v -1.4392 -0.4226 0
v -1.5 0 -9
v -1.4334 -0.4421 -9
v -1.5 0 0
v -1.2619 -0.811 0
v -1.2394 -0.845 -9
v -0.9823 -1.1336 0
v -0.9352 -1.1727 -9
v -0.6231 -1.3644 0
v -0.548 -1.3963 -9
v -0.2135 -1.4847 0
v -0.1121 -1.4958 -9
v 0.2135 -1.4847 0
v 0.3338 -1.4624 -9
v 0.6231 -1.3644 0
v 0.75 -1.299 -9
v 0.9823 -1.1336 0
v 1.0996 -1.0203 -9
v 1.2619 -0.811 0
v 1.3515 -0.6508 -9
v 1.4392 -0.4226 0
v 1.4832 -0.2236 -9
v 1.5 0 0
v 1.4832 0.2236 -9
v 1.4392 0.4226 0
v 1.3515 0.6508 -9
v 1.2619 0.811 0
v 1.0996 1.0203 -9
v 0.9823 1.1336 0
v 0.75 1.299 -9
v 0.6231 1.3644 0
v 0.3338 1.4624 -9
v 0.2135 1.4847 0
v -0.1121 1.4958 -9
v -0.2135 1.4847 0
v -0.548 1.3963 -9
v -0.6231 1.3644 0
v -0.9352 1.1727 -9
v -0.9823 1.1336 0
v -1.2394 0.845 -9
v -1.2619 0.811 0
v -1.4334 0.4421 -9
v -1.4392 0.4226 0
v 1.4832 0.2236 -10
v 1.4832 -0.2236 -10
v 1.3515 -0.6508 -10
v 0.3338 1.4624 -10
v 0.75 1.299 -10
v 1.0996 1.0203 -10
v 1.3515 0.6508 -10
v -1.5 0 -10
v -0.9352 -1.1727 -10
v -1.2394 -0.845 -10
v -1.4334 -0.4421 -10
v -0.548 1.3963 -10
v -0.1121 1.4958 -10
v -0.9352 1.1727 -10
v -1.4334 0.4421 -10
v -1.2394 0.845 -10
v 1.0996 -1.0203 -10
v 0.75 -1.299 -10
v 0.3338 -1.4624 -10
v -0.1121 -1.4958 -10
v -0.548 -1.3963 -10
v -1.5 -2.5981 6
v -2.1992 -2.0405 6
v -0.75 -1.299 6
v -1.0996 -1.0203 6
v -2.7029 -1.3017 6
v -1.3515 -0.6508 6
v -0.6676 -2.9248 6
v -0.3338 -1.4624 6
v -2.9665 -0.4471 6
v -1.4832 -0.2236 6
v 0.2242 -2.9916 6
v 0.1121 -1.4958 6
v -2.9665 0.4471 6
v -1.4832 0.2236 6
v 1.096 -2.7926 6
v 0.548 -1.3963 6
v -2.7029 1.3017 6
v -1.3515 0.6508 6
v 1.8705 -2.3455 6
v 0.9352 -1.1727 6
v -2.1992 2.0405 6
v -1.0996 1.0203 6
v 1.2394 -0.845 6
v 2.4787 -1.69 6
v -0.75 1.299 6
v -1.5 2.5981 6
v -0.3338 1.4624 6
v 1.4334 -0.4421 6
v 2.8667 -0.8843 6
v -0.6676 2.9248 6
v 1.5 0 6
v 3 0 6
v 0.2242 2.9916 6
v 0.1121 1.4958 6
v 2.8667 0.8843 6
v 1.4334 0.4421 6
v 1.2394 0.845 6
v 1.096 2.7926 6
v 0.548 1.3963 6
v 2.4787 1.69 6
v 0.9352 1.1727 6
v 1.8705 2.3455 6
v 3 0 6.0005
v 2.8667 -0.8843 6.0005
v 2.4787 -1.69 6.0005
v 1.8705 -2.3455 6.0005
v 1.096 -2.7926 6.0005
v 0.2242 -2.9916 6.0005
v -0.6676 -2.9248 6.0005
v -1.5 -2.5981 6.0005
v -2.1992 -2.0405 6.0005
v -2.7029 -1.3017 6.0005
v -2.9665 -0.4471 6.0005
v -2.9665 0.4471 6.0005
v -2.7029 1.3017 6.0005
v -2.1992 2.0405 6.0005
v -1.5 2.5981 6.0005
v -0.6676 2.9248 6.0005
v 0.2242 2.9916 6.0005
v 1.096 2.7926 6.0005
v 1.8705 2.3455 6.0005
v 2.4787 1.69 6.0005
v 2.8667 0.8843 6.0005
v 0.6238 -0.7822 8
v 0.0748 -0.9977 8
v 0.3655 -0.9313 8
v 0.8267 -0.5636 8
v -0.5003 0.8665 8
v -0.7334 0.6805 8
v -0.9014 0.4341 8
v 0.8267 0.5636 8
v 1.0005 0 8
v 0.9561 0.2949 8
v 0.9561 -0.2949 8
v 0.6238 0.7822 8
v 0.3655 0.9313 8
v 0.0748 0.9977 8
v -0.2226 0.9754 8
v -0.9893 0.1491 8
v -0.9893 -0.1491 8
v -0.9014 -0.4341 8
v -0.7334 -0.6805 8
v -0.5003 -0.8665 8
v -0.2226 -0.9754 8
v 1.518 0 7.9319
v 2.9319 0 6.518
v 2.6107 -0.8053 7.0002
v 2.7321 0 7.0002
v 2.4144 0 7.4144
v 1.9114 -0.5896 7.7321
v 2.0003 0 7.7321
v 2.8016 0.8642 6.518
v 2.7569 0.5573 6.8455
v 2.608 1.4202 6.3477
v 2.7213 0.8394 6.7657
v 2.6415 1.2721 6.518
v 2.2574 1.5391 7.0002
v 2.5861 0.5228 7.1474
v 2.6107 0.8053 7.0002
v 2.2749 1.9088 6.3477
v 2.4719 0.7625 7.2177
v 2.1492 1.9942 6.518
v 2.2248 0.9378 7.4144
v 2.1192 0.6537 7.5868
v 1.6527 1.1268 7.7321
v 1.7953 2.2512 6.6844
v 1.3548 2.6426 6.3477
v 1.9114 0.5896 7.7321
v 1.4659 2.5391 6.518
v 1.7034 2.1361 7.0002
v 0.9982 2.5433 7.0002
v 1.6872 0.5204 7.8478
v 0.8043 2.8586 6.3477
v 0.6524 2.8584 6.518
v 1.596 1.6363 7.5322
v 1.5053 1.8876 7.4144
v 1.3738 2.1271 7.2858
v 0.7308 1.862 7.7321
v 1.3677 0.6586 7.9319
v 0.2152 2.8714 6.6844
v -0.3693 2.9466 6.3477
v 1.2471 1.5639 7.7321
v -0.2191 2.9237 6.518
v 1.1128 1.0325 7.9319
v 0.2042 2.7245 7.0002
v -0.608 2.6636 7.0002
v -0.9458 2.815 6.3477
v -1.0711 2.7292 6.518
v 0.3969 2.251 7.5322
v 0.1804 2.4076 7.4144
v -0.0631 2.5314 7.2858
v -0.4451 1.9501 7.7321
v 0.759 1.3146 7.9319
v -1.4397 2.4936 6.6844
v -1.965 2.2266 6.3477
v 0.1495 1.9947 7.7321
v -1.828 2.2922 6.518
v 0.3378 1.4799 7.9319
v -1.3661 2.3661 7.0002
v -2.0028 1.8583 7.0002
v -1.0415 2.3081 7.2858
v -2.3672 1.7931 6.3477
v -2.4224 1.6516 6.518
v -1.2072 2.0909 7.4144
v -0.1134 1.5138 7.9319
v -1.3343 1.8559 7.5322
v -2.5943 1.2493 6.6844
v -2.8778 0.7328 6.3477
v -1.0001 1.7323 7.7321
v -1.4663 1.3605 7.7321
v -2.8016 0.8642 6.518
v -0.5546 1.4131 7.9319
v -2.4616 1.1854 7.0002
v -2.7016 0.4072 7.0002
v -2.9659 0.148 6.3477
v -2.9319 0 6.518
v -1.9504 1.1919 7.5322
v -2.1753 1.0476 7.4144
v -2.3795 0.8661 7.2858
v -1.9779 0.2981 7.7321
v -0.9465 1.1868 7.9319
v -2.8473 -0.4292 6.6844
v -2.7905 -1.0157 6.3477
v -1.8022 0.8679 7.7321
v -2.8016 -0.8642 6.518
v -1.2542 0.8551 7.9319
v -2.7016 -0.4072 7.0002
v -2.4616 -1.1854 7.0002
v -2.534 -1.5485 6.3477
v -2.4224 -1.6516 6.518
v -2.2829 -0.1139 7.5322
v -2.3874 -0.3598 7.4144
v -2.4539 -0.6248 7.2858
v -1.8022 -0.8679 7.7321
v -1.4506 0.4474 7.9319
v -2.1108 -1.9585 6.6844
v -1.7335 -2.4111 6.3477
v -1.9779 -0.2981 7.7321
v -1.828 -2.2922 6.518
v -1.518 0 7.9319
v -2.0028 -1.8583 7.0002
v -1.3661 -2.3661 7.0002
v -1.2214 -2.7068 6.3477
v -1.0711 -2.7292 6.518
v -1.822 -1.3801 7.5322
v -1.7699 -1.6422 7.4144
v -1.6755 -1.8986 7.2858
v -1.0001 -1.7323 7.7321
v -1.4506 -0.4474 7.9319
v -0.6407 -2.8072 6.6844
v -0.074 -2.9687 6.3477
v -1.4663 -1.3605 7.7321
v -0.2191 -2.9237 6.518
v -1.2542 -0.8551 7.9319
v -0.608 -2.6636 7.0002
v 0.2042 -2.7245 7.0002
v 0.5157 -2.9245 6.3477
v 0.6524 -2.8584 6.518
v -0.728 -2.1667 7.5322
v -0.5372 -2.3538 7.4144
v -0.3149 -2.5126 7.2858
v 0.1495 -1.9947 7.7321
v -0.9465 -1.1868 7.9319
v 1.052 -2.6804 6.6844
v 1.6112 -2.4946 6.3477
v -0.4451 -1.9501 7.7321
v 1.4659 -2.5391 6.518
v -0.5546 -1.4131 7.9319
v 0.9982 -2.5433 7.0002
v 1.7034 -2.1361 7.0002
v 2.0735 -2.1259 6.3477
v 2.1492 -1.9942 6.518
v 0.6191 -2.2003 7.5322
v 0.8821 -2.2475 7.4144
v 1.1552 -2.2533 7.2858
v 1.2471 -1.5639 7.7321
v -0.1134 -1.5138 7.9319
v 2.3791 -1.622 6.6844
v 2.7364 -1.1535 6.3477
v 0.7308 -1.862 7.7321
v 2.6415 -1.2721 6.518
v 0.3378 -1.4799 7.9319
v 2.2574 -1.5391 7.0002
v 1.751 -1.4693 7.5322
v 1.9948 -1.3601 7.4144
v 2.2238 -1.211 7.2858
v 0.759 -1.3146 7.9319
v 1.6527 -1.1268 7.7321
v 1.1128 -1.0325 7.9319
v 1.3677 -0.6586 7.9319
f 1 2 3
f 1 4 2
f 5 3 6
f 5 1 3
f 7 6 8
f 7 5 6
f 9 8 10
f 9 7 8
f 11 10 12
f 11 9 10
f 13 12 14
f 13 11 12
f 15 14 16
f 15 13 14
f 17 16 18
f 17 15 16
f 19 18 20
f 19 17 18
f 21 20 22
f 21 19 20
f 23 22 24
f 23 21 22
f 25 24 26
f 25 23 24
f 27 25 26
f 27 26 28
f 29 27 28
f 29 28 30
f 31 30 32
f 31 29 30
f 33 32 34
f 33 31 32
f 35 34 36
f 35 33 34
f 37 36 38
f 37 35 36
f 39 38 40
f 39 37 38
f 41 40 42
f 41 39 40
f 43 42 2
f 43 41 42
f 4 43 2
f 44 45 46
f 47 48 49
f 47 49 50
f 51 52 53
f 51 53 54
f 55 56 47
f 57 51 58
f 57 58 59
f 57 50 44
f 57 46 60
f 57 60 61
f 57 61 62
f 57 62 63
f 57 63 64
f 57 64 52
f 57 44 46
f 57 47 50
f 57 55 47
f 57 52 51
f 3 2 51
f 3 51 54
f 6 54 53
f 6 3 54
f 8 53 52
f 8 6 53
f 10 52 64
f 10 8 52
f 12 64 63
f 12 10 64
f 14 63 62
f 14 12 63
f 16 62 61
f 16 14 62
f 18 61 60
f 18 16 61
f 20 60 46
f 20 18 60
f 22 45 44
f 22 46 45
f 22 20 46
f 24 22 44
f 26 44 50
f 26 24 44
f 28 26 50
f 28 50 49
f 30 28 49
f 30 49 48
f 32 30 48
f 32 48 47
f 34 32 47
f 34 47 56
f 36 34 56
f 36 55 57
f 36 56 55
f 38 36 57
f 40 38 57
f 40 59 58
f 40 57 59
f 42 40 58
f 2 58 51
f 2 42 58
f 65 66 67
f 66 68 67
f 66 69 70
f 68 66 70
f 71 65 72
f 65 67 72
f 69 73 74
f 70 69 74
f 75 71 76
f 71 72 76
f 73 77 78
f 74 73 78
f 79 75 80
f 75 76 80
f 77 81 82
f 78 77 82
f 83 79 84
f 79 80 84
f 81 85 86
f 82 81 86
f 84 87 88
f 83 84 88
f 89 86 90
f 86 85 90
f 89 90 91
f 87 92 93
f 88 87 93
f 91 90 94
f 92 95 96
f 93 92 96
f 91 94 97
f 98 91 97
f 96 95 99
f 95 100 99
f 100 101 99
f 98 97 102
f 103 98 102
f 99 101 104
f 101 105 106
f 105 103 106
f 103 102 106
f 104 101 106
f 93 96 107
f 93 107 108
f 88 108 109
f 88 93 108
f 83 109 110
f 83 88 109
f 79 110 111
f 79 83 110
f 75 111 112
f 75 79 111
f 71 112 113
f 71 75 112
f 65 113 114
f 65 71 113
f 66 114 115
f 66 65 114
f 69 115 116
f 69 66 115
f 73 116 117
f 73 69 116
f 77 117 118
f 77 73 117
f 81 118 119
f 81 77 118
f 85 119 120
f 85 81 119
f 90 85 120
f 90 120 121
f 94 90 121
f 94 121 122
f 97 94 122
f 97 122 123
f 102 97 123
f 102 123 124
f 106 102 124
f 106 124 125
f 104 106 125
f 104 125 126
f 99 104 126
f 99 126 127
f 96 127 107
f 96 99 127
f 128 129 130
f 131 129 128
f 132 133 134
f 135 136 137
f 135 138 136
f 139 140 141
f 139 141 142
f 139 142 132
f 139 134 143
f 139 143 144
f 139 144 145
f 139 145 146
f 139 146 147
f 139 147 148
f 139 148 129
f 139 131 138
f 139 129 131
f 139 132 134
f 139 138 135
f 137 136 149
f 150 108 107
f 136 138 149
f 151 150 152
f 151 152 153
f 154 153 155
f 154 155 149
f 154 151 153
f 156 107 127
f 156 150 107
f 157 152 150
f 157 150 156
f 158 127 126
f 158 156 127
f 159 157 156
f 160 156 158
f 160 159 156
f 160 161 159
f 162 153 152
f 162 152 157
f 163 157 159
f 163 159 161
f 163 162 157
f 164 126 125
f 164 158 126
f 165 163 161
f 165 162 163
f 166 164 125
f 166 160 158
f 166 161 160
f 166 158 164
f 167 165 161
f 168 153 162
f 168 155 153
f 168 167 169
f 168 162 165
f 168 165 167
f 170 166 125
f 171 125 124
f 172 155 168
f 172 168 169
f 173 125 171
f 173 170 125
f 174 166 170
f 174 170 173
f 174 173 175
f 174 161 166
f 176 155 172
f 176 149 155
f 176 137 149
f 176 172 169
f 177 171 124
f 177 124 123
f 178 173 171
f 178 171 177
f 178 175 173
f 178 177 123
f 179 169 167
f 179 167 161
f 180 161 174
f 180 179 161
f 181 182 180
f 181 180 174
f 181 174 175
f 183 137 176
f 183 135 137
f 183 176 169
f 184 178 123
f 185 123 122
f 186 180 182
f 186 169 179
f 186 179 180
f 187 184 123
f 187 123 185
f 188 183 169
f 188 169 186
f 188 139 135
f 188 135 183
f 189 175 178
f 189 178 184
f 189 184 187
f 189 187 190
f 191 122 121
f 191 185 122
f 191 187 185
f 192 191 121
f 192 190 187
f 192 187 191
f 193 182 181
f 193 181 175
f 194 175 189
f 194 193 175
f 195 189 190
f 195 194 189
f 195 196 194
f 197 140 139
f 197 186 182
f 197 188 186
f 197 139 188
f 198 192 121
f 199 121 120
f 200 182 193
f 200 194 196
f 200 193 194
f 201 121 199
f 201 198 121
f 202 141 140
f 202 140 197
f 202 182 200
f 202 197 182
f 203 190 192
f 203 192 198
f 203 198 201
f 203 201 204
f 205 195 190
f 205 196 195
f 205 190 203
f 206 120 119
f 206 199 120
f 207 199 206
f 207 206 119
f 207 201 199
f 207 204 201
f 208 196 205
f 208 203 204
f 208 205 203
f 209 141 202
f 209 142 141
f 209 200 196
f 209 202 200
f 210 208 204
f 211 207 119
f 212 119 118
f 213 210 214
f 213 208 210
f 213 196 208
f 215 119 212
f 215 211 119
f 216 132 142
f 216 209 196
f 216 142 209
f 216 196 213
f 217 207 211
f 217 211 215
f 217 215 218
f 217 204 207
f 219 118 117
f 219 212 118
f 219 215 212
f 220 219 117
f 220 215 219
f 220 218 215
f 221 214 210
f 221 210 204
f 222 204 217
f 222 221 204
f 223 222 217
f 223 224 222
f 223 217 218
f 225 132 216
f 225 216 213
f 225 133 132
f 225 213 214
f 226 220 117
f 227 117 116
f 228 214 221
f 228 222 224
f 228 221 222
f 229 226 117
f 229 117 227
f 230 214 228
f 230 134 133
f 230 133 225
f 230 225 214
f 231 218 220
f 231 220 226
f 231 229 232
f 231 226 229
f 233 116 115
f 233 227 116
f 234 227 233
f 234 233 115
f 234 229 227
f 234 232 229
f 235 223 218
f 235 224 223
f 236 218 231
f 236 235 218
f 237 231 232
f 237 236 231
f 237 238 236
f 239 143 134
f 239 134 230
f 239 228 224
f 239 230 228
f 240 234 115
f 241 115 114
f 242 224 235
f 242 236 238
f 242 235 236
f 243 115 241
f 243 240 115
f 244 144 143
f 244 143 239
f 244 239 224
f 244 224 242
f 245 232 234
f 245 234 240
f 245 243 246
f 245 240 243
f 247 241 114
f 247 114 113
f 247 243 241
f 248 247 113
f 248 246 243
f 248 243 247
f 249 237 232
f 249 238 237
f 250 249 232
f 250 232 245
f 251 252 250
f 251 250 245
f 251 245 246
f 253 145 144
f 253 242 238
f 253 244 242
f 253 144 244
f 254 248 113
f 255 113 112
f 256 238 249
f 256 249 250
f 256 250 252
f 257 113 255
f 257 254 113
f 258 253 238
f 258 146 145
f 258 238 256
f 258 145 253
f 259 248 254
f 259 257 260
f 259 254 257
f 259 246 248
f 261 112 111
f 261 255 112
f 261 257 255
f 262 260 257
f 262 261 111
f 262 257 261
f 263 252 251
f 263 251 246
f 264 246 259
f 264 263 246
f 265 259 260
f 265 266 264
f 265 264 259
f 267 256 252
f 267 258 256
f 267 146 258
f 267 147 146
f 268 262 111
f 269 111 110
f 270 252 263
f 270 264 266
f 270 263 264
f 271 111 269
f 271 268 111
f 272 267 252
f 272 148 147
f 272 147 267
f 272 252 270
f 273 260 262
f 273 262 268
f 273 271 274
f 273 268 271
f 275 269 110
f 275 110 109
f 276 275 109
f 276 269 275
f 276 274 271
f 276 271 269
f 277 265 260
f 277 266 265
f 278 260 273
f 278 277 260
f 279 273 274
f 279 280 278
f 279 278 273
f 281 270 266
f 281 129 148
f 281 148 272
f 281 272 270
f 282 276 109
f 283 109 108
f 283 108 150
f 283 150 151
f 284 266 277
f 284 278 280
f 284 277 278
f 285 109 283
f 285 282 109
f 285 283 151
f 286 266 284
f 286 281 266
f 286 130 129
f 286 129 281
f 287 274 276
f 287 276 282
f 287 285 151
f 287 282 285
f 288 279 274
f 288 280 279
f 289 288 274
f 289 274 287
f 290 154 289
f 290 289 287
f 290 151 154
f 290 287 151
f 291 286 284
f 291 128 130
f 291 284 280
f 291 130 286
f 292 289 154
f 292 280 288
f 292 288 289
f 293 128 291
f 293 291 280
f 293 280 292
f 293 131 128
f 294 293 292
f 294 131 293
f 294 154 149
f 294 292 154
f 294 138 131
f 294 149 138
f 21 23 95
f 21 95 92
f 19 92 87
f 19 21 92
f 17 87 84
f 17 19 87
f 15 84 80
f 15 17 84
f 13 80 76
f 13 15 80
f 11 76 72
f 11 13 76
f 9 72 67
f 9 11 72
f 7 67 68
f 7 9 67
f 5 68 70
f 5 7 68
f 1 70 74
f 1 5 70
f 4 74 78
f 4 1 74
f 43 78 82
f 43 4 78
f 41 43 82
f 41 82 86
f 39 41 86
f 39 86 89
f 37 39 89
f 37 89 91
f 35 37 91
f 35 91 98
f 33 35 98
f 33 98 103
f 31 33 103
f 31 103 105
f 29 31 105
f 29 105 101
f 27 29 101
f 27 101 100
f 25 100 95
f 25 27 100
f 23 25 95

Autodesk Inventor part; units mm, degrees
ref_plane "YZ Plane" through (0, 0, 0) normal (1, 0, 0) x (0, 1, 0)
ref_plane "XZ Plane" through (0, 0, 0) normal (0, 1, 0) x (-1, 0, 0)
ref_plane "XY Plane" through (0, 0, 0) normal (0, 0, 1) x (1, 0, 0)
sketch "スケッチ1" plane through (0, 0, 0) normal (0, 0, 1) x (1, 0, 0)
  circle A0 centre (0, 0) radius 1.5
  dimension "d0" = 3
extrude "押し出し1" add sketch "スケッチ1" along normal blind 6
sketch "スケッチ2" plane through (0, 0, 6) normal (0, 0, 1) x (1, 0, 0)
  circle A0 centre (0, 0) radius 1.5 projected
  circle A1 centre (0, 0) radius 3
  dimension "d3" = 6
extrude "押し出し2" add sketch "スケッチ2" along normal blind 2 contours A0 | A1
fillet "フィレット1" radius 2 1 edges at (-3, 0, 8)
thread "ねじ1" size "M3x0.5" class "6g" standard "ANSI Metric M Profile" full length
sketch "スケッチ3" plane through (0, 0, 0) normal (0, 0, -1) x (-1, 0, 0)
  circle A0 centre (0, 0) radius 1.5 projected
extrude "押し出し3" add sketch "スケッチ3" along normal blind 9
sketch "スケッチ4" plane through (0, 0, -9) normal (0, 0, -1) x (-1, 0, 0)
  circle A0 centre (0, 0) radius 1.5 projected
extrude "押し出し4" add sketch "スケッチ4" along normal blind 1
properties part number "SB　16mmなべネジ" material "Steel, Mild"
